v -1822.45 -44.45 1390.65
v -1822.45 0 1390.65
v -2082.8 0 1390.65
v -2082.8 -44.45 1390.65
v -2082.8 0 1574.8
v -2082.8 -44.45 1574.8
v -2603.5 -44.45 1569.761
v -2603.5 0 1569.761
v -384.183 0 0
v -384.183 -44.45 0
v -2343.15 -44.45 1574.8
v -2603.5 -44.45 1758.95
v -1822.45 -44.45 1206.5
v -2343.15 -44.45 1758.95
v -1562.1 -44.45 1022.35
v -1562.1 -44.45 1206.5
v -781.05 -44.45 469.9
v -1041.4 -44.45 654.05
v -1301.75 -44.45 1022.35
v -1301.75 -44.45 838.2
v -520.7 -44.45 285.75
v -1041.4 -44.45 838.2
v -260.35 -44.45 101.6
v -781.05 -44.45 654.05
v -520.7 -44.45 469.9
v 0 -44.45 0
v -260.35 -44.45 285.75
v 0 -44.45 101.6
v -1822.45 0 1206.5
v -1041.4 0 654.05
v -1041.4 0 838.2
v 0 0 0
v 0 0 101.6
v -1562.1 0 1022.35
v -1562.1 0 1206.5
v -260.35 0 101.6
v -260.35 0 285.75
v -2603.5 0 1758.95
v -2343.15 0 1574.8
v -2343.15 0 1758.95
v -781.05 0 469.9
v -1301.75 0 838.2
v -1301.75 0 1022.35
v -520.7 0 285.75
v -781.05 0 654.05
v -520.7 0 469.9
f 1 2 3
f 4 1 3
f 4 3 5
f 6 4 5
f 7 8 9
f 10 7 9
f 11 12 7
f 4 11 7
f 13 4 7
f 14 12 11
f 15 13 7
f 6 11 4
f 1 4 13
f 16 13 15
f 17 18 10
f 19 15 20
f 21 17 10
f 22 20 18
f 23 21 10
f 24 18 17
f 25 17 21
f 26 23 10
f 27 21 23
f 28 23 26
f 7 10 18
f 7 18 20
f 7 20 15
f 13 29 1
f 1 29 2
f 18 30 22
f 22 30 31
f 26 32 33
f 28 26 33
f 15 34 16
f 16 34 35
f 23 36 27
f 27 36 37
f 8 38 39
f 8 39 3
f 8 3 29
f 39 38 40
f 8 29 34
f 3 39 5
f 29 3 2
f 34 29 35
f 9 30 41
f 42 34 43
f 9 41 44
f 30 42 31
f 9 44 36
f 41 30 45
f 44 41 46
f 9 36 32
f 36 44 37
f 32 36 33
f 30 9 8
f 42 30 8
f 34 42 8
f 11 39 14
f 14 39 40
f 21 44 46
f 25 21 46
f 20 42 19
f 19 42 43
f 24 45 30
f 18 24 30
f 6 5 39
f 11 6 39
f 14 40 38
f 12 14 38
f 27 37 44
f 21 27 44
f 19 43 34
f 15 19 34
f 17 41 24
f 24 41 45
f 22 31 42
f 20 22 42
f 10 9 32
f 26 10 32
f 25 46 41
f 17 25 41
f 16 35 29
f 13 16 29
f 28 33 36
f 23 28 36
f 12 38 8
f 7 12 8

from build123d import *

# Parameters (mm, degrees)
F1_DEPTH = 44.45


with BuildPart() as f1:
    # F0 (on Front) → F1 (new body)
    with BuildSketch(Plane.XZ):
        Polygon((-384.183073, 0), (0, 0), (0, 101.6), (-260.35, 101.6), (-260.35, 285.75), (-520.7, 285.75), (-520.7, 469.9), (-781.05, 469.9), (-781.05, 654.05), (-1041.4, 654.05), (-1041.4, 838.2), (-1301.75, 838.2), (-1301.75, 1022.35), (-1562.1, 1022.35), (-1562.1, 1206.5), (-1822.45, 1206.5), (-1822.45, 1390.65), (-2082.8, 1390.65), (-2082.8, 1574.8), (-2343.15, 1574.8), (-2343.15, 1758.95), (-2603.5, 1758.95), (-2603.5, 1569.760753), align=None)
    extrude(amount=F1_DEPTH)


solid = f1.part
